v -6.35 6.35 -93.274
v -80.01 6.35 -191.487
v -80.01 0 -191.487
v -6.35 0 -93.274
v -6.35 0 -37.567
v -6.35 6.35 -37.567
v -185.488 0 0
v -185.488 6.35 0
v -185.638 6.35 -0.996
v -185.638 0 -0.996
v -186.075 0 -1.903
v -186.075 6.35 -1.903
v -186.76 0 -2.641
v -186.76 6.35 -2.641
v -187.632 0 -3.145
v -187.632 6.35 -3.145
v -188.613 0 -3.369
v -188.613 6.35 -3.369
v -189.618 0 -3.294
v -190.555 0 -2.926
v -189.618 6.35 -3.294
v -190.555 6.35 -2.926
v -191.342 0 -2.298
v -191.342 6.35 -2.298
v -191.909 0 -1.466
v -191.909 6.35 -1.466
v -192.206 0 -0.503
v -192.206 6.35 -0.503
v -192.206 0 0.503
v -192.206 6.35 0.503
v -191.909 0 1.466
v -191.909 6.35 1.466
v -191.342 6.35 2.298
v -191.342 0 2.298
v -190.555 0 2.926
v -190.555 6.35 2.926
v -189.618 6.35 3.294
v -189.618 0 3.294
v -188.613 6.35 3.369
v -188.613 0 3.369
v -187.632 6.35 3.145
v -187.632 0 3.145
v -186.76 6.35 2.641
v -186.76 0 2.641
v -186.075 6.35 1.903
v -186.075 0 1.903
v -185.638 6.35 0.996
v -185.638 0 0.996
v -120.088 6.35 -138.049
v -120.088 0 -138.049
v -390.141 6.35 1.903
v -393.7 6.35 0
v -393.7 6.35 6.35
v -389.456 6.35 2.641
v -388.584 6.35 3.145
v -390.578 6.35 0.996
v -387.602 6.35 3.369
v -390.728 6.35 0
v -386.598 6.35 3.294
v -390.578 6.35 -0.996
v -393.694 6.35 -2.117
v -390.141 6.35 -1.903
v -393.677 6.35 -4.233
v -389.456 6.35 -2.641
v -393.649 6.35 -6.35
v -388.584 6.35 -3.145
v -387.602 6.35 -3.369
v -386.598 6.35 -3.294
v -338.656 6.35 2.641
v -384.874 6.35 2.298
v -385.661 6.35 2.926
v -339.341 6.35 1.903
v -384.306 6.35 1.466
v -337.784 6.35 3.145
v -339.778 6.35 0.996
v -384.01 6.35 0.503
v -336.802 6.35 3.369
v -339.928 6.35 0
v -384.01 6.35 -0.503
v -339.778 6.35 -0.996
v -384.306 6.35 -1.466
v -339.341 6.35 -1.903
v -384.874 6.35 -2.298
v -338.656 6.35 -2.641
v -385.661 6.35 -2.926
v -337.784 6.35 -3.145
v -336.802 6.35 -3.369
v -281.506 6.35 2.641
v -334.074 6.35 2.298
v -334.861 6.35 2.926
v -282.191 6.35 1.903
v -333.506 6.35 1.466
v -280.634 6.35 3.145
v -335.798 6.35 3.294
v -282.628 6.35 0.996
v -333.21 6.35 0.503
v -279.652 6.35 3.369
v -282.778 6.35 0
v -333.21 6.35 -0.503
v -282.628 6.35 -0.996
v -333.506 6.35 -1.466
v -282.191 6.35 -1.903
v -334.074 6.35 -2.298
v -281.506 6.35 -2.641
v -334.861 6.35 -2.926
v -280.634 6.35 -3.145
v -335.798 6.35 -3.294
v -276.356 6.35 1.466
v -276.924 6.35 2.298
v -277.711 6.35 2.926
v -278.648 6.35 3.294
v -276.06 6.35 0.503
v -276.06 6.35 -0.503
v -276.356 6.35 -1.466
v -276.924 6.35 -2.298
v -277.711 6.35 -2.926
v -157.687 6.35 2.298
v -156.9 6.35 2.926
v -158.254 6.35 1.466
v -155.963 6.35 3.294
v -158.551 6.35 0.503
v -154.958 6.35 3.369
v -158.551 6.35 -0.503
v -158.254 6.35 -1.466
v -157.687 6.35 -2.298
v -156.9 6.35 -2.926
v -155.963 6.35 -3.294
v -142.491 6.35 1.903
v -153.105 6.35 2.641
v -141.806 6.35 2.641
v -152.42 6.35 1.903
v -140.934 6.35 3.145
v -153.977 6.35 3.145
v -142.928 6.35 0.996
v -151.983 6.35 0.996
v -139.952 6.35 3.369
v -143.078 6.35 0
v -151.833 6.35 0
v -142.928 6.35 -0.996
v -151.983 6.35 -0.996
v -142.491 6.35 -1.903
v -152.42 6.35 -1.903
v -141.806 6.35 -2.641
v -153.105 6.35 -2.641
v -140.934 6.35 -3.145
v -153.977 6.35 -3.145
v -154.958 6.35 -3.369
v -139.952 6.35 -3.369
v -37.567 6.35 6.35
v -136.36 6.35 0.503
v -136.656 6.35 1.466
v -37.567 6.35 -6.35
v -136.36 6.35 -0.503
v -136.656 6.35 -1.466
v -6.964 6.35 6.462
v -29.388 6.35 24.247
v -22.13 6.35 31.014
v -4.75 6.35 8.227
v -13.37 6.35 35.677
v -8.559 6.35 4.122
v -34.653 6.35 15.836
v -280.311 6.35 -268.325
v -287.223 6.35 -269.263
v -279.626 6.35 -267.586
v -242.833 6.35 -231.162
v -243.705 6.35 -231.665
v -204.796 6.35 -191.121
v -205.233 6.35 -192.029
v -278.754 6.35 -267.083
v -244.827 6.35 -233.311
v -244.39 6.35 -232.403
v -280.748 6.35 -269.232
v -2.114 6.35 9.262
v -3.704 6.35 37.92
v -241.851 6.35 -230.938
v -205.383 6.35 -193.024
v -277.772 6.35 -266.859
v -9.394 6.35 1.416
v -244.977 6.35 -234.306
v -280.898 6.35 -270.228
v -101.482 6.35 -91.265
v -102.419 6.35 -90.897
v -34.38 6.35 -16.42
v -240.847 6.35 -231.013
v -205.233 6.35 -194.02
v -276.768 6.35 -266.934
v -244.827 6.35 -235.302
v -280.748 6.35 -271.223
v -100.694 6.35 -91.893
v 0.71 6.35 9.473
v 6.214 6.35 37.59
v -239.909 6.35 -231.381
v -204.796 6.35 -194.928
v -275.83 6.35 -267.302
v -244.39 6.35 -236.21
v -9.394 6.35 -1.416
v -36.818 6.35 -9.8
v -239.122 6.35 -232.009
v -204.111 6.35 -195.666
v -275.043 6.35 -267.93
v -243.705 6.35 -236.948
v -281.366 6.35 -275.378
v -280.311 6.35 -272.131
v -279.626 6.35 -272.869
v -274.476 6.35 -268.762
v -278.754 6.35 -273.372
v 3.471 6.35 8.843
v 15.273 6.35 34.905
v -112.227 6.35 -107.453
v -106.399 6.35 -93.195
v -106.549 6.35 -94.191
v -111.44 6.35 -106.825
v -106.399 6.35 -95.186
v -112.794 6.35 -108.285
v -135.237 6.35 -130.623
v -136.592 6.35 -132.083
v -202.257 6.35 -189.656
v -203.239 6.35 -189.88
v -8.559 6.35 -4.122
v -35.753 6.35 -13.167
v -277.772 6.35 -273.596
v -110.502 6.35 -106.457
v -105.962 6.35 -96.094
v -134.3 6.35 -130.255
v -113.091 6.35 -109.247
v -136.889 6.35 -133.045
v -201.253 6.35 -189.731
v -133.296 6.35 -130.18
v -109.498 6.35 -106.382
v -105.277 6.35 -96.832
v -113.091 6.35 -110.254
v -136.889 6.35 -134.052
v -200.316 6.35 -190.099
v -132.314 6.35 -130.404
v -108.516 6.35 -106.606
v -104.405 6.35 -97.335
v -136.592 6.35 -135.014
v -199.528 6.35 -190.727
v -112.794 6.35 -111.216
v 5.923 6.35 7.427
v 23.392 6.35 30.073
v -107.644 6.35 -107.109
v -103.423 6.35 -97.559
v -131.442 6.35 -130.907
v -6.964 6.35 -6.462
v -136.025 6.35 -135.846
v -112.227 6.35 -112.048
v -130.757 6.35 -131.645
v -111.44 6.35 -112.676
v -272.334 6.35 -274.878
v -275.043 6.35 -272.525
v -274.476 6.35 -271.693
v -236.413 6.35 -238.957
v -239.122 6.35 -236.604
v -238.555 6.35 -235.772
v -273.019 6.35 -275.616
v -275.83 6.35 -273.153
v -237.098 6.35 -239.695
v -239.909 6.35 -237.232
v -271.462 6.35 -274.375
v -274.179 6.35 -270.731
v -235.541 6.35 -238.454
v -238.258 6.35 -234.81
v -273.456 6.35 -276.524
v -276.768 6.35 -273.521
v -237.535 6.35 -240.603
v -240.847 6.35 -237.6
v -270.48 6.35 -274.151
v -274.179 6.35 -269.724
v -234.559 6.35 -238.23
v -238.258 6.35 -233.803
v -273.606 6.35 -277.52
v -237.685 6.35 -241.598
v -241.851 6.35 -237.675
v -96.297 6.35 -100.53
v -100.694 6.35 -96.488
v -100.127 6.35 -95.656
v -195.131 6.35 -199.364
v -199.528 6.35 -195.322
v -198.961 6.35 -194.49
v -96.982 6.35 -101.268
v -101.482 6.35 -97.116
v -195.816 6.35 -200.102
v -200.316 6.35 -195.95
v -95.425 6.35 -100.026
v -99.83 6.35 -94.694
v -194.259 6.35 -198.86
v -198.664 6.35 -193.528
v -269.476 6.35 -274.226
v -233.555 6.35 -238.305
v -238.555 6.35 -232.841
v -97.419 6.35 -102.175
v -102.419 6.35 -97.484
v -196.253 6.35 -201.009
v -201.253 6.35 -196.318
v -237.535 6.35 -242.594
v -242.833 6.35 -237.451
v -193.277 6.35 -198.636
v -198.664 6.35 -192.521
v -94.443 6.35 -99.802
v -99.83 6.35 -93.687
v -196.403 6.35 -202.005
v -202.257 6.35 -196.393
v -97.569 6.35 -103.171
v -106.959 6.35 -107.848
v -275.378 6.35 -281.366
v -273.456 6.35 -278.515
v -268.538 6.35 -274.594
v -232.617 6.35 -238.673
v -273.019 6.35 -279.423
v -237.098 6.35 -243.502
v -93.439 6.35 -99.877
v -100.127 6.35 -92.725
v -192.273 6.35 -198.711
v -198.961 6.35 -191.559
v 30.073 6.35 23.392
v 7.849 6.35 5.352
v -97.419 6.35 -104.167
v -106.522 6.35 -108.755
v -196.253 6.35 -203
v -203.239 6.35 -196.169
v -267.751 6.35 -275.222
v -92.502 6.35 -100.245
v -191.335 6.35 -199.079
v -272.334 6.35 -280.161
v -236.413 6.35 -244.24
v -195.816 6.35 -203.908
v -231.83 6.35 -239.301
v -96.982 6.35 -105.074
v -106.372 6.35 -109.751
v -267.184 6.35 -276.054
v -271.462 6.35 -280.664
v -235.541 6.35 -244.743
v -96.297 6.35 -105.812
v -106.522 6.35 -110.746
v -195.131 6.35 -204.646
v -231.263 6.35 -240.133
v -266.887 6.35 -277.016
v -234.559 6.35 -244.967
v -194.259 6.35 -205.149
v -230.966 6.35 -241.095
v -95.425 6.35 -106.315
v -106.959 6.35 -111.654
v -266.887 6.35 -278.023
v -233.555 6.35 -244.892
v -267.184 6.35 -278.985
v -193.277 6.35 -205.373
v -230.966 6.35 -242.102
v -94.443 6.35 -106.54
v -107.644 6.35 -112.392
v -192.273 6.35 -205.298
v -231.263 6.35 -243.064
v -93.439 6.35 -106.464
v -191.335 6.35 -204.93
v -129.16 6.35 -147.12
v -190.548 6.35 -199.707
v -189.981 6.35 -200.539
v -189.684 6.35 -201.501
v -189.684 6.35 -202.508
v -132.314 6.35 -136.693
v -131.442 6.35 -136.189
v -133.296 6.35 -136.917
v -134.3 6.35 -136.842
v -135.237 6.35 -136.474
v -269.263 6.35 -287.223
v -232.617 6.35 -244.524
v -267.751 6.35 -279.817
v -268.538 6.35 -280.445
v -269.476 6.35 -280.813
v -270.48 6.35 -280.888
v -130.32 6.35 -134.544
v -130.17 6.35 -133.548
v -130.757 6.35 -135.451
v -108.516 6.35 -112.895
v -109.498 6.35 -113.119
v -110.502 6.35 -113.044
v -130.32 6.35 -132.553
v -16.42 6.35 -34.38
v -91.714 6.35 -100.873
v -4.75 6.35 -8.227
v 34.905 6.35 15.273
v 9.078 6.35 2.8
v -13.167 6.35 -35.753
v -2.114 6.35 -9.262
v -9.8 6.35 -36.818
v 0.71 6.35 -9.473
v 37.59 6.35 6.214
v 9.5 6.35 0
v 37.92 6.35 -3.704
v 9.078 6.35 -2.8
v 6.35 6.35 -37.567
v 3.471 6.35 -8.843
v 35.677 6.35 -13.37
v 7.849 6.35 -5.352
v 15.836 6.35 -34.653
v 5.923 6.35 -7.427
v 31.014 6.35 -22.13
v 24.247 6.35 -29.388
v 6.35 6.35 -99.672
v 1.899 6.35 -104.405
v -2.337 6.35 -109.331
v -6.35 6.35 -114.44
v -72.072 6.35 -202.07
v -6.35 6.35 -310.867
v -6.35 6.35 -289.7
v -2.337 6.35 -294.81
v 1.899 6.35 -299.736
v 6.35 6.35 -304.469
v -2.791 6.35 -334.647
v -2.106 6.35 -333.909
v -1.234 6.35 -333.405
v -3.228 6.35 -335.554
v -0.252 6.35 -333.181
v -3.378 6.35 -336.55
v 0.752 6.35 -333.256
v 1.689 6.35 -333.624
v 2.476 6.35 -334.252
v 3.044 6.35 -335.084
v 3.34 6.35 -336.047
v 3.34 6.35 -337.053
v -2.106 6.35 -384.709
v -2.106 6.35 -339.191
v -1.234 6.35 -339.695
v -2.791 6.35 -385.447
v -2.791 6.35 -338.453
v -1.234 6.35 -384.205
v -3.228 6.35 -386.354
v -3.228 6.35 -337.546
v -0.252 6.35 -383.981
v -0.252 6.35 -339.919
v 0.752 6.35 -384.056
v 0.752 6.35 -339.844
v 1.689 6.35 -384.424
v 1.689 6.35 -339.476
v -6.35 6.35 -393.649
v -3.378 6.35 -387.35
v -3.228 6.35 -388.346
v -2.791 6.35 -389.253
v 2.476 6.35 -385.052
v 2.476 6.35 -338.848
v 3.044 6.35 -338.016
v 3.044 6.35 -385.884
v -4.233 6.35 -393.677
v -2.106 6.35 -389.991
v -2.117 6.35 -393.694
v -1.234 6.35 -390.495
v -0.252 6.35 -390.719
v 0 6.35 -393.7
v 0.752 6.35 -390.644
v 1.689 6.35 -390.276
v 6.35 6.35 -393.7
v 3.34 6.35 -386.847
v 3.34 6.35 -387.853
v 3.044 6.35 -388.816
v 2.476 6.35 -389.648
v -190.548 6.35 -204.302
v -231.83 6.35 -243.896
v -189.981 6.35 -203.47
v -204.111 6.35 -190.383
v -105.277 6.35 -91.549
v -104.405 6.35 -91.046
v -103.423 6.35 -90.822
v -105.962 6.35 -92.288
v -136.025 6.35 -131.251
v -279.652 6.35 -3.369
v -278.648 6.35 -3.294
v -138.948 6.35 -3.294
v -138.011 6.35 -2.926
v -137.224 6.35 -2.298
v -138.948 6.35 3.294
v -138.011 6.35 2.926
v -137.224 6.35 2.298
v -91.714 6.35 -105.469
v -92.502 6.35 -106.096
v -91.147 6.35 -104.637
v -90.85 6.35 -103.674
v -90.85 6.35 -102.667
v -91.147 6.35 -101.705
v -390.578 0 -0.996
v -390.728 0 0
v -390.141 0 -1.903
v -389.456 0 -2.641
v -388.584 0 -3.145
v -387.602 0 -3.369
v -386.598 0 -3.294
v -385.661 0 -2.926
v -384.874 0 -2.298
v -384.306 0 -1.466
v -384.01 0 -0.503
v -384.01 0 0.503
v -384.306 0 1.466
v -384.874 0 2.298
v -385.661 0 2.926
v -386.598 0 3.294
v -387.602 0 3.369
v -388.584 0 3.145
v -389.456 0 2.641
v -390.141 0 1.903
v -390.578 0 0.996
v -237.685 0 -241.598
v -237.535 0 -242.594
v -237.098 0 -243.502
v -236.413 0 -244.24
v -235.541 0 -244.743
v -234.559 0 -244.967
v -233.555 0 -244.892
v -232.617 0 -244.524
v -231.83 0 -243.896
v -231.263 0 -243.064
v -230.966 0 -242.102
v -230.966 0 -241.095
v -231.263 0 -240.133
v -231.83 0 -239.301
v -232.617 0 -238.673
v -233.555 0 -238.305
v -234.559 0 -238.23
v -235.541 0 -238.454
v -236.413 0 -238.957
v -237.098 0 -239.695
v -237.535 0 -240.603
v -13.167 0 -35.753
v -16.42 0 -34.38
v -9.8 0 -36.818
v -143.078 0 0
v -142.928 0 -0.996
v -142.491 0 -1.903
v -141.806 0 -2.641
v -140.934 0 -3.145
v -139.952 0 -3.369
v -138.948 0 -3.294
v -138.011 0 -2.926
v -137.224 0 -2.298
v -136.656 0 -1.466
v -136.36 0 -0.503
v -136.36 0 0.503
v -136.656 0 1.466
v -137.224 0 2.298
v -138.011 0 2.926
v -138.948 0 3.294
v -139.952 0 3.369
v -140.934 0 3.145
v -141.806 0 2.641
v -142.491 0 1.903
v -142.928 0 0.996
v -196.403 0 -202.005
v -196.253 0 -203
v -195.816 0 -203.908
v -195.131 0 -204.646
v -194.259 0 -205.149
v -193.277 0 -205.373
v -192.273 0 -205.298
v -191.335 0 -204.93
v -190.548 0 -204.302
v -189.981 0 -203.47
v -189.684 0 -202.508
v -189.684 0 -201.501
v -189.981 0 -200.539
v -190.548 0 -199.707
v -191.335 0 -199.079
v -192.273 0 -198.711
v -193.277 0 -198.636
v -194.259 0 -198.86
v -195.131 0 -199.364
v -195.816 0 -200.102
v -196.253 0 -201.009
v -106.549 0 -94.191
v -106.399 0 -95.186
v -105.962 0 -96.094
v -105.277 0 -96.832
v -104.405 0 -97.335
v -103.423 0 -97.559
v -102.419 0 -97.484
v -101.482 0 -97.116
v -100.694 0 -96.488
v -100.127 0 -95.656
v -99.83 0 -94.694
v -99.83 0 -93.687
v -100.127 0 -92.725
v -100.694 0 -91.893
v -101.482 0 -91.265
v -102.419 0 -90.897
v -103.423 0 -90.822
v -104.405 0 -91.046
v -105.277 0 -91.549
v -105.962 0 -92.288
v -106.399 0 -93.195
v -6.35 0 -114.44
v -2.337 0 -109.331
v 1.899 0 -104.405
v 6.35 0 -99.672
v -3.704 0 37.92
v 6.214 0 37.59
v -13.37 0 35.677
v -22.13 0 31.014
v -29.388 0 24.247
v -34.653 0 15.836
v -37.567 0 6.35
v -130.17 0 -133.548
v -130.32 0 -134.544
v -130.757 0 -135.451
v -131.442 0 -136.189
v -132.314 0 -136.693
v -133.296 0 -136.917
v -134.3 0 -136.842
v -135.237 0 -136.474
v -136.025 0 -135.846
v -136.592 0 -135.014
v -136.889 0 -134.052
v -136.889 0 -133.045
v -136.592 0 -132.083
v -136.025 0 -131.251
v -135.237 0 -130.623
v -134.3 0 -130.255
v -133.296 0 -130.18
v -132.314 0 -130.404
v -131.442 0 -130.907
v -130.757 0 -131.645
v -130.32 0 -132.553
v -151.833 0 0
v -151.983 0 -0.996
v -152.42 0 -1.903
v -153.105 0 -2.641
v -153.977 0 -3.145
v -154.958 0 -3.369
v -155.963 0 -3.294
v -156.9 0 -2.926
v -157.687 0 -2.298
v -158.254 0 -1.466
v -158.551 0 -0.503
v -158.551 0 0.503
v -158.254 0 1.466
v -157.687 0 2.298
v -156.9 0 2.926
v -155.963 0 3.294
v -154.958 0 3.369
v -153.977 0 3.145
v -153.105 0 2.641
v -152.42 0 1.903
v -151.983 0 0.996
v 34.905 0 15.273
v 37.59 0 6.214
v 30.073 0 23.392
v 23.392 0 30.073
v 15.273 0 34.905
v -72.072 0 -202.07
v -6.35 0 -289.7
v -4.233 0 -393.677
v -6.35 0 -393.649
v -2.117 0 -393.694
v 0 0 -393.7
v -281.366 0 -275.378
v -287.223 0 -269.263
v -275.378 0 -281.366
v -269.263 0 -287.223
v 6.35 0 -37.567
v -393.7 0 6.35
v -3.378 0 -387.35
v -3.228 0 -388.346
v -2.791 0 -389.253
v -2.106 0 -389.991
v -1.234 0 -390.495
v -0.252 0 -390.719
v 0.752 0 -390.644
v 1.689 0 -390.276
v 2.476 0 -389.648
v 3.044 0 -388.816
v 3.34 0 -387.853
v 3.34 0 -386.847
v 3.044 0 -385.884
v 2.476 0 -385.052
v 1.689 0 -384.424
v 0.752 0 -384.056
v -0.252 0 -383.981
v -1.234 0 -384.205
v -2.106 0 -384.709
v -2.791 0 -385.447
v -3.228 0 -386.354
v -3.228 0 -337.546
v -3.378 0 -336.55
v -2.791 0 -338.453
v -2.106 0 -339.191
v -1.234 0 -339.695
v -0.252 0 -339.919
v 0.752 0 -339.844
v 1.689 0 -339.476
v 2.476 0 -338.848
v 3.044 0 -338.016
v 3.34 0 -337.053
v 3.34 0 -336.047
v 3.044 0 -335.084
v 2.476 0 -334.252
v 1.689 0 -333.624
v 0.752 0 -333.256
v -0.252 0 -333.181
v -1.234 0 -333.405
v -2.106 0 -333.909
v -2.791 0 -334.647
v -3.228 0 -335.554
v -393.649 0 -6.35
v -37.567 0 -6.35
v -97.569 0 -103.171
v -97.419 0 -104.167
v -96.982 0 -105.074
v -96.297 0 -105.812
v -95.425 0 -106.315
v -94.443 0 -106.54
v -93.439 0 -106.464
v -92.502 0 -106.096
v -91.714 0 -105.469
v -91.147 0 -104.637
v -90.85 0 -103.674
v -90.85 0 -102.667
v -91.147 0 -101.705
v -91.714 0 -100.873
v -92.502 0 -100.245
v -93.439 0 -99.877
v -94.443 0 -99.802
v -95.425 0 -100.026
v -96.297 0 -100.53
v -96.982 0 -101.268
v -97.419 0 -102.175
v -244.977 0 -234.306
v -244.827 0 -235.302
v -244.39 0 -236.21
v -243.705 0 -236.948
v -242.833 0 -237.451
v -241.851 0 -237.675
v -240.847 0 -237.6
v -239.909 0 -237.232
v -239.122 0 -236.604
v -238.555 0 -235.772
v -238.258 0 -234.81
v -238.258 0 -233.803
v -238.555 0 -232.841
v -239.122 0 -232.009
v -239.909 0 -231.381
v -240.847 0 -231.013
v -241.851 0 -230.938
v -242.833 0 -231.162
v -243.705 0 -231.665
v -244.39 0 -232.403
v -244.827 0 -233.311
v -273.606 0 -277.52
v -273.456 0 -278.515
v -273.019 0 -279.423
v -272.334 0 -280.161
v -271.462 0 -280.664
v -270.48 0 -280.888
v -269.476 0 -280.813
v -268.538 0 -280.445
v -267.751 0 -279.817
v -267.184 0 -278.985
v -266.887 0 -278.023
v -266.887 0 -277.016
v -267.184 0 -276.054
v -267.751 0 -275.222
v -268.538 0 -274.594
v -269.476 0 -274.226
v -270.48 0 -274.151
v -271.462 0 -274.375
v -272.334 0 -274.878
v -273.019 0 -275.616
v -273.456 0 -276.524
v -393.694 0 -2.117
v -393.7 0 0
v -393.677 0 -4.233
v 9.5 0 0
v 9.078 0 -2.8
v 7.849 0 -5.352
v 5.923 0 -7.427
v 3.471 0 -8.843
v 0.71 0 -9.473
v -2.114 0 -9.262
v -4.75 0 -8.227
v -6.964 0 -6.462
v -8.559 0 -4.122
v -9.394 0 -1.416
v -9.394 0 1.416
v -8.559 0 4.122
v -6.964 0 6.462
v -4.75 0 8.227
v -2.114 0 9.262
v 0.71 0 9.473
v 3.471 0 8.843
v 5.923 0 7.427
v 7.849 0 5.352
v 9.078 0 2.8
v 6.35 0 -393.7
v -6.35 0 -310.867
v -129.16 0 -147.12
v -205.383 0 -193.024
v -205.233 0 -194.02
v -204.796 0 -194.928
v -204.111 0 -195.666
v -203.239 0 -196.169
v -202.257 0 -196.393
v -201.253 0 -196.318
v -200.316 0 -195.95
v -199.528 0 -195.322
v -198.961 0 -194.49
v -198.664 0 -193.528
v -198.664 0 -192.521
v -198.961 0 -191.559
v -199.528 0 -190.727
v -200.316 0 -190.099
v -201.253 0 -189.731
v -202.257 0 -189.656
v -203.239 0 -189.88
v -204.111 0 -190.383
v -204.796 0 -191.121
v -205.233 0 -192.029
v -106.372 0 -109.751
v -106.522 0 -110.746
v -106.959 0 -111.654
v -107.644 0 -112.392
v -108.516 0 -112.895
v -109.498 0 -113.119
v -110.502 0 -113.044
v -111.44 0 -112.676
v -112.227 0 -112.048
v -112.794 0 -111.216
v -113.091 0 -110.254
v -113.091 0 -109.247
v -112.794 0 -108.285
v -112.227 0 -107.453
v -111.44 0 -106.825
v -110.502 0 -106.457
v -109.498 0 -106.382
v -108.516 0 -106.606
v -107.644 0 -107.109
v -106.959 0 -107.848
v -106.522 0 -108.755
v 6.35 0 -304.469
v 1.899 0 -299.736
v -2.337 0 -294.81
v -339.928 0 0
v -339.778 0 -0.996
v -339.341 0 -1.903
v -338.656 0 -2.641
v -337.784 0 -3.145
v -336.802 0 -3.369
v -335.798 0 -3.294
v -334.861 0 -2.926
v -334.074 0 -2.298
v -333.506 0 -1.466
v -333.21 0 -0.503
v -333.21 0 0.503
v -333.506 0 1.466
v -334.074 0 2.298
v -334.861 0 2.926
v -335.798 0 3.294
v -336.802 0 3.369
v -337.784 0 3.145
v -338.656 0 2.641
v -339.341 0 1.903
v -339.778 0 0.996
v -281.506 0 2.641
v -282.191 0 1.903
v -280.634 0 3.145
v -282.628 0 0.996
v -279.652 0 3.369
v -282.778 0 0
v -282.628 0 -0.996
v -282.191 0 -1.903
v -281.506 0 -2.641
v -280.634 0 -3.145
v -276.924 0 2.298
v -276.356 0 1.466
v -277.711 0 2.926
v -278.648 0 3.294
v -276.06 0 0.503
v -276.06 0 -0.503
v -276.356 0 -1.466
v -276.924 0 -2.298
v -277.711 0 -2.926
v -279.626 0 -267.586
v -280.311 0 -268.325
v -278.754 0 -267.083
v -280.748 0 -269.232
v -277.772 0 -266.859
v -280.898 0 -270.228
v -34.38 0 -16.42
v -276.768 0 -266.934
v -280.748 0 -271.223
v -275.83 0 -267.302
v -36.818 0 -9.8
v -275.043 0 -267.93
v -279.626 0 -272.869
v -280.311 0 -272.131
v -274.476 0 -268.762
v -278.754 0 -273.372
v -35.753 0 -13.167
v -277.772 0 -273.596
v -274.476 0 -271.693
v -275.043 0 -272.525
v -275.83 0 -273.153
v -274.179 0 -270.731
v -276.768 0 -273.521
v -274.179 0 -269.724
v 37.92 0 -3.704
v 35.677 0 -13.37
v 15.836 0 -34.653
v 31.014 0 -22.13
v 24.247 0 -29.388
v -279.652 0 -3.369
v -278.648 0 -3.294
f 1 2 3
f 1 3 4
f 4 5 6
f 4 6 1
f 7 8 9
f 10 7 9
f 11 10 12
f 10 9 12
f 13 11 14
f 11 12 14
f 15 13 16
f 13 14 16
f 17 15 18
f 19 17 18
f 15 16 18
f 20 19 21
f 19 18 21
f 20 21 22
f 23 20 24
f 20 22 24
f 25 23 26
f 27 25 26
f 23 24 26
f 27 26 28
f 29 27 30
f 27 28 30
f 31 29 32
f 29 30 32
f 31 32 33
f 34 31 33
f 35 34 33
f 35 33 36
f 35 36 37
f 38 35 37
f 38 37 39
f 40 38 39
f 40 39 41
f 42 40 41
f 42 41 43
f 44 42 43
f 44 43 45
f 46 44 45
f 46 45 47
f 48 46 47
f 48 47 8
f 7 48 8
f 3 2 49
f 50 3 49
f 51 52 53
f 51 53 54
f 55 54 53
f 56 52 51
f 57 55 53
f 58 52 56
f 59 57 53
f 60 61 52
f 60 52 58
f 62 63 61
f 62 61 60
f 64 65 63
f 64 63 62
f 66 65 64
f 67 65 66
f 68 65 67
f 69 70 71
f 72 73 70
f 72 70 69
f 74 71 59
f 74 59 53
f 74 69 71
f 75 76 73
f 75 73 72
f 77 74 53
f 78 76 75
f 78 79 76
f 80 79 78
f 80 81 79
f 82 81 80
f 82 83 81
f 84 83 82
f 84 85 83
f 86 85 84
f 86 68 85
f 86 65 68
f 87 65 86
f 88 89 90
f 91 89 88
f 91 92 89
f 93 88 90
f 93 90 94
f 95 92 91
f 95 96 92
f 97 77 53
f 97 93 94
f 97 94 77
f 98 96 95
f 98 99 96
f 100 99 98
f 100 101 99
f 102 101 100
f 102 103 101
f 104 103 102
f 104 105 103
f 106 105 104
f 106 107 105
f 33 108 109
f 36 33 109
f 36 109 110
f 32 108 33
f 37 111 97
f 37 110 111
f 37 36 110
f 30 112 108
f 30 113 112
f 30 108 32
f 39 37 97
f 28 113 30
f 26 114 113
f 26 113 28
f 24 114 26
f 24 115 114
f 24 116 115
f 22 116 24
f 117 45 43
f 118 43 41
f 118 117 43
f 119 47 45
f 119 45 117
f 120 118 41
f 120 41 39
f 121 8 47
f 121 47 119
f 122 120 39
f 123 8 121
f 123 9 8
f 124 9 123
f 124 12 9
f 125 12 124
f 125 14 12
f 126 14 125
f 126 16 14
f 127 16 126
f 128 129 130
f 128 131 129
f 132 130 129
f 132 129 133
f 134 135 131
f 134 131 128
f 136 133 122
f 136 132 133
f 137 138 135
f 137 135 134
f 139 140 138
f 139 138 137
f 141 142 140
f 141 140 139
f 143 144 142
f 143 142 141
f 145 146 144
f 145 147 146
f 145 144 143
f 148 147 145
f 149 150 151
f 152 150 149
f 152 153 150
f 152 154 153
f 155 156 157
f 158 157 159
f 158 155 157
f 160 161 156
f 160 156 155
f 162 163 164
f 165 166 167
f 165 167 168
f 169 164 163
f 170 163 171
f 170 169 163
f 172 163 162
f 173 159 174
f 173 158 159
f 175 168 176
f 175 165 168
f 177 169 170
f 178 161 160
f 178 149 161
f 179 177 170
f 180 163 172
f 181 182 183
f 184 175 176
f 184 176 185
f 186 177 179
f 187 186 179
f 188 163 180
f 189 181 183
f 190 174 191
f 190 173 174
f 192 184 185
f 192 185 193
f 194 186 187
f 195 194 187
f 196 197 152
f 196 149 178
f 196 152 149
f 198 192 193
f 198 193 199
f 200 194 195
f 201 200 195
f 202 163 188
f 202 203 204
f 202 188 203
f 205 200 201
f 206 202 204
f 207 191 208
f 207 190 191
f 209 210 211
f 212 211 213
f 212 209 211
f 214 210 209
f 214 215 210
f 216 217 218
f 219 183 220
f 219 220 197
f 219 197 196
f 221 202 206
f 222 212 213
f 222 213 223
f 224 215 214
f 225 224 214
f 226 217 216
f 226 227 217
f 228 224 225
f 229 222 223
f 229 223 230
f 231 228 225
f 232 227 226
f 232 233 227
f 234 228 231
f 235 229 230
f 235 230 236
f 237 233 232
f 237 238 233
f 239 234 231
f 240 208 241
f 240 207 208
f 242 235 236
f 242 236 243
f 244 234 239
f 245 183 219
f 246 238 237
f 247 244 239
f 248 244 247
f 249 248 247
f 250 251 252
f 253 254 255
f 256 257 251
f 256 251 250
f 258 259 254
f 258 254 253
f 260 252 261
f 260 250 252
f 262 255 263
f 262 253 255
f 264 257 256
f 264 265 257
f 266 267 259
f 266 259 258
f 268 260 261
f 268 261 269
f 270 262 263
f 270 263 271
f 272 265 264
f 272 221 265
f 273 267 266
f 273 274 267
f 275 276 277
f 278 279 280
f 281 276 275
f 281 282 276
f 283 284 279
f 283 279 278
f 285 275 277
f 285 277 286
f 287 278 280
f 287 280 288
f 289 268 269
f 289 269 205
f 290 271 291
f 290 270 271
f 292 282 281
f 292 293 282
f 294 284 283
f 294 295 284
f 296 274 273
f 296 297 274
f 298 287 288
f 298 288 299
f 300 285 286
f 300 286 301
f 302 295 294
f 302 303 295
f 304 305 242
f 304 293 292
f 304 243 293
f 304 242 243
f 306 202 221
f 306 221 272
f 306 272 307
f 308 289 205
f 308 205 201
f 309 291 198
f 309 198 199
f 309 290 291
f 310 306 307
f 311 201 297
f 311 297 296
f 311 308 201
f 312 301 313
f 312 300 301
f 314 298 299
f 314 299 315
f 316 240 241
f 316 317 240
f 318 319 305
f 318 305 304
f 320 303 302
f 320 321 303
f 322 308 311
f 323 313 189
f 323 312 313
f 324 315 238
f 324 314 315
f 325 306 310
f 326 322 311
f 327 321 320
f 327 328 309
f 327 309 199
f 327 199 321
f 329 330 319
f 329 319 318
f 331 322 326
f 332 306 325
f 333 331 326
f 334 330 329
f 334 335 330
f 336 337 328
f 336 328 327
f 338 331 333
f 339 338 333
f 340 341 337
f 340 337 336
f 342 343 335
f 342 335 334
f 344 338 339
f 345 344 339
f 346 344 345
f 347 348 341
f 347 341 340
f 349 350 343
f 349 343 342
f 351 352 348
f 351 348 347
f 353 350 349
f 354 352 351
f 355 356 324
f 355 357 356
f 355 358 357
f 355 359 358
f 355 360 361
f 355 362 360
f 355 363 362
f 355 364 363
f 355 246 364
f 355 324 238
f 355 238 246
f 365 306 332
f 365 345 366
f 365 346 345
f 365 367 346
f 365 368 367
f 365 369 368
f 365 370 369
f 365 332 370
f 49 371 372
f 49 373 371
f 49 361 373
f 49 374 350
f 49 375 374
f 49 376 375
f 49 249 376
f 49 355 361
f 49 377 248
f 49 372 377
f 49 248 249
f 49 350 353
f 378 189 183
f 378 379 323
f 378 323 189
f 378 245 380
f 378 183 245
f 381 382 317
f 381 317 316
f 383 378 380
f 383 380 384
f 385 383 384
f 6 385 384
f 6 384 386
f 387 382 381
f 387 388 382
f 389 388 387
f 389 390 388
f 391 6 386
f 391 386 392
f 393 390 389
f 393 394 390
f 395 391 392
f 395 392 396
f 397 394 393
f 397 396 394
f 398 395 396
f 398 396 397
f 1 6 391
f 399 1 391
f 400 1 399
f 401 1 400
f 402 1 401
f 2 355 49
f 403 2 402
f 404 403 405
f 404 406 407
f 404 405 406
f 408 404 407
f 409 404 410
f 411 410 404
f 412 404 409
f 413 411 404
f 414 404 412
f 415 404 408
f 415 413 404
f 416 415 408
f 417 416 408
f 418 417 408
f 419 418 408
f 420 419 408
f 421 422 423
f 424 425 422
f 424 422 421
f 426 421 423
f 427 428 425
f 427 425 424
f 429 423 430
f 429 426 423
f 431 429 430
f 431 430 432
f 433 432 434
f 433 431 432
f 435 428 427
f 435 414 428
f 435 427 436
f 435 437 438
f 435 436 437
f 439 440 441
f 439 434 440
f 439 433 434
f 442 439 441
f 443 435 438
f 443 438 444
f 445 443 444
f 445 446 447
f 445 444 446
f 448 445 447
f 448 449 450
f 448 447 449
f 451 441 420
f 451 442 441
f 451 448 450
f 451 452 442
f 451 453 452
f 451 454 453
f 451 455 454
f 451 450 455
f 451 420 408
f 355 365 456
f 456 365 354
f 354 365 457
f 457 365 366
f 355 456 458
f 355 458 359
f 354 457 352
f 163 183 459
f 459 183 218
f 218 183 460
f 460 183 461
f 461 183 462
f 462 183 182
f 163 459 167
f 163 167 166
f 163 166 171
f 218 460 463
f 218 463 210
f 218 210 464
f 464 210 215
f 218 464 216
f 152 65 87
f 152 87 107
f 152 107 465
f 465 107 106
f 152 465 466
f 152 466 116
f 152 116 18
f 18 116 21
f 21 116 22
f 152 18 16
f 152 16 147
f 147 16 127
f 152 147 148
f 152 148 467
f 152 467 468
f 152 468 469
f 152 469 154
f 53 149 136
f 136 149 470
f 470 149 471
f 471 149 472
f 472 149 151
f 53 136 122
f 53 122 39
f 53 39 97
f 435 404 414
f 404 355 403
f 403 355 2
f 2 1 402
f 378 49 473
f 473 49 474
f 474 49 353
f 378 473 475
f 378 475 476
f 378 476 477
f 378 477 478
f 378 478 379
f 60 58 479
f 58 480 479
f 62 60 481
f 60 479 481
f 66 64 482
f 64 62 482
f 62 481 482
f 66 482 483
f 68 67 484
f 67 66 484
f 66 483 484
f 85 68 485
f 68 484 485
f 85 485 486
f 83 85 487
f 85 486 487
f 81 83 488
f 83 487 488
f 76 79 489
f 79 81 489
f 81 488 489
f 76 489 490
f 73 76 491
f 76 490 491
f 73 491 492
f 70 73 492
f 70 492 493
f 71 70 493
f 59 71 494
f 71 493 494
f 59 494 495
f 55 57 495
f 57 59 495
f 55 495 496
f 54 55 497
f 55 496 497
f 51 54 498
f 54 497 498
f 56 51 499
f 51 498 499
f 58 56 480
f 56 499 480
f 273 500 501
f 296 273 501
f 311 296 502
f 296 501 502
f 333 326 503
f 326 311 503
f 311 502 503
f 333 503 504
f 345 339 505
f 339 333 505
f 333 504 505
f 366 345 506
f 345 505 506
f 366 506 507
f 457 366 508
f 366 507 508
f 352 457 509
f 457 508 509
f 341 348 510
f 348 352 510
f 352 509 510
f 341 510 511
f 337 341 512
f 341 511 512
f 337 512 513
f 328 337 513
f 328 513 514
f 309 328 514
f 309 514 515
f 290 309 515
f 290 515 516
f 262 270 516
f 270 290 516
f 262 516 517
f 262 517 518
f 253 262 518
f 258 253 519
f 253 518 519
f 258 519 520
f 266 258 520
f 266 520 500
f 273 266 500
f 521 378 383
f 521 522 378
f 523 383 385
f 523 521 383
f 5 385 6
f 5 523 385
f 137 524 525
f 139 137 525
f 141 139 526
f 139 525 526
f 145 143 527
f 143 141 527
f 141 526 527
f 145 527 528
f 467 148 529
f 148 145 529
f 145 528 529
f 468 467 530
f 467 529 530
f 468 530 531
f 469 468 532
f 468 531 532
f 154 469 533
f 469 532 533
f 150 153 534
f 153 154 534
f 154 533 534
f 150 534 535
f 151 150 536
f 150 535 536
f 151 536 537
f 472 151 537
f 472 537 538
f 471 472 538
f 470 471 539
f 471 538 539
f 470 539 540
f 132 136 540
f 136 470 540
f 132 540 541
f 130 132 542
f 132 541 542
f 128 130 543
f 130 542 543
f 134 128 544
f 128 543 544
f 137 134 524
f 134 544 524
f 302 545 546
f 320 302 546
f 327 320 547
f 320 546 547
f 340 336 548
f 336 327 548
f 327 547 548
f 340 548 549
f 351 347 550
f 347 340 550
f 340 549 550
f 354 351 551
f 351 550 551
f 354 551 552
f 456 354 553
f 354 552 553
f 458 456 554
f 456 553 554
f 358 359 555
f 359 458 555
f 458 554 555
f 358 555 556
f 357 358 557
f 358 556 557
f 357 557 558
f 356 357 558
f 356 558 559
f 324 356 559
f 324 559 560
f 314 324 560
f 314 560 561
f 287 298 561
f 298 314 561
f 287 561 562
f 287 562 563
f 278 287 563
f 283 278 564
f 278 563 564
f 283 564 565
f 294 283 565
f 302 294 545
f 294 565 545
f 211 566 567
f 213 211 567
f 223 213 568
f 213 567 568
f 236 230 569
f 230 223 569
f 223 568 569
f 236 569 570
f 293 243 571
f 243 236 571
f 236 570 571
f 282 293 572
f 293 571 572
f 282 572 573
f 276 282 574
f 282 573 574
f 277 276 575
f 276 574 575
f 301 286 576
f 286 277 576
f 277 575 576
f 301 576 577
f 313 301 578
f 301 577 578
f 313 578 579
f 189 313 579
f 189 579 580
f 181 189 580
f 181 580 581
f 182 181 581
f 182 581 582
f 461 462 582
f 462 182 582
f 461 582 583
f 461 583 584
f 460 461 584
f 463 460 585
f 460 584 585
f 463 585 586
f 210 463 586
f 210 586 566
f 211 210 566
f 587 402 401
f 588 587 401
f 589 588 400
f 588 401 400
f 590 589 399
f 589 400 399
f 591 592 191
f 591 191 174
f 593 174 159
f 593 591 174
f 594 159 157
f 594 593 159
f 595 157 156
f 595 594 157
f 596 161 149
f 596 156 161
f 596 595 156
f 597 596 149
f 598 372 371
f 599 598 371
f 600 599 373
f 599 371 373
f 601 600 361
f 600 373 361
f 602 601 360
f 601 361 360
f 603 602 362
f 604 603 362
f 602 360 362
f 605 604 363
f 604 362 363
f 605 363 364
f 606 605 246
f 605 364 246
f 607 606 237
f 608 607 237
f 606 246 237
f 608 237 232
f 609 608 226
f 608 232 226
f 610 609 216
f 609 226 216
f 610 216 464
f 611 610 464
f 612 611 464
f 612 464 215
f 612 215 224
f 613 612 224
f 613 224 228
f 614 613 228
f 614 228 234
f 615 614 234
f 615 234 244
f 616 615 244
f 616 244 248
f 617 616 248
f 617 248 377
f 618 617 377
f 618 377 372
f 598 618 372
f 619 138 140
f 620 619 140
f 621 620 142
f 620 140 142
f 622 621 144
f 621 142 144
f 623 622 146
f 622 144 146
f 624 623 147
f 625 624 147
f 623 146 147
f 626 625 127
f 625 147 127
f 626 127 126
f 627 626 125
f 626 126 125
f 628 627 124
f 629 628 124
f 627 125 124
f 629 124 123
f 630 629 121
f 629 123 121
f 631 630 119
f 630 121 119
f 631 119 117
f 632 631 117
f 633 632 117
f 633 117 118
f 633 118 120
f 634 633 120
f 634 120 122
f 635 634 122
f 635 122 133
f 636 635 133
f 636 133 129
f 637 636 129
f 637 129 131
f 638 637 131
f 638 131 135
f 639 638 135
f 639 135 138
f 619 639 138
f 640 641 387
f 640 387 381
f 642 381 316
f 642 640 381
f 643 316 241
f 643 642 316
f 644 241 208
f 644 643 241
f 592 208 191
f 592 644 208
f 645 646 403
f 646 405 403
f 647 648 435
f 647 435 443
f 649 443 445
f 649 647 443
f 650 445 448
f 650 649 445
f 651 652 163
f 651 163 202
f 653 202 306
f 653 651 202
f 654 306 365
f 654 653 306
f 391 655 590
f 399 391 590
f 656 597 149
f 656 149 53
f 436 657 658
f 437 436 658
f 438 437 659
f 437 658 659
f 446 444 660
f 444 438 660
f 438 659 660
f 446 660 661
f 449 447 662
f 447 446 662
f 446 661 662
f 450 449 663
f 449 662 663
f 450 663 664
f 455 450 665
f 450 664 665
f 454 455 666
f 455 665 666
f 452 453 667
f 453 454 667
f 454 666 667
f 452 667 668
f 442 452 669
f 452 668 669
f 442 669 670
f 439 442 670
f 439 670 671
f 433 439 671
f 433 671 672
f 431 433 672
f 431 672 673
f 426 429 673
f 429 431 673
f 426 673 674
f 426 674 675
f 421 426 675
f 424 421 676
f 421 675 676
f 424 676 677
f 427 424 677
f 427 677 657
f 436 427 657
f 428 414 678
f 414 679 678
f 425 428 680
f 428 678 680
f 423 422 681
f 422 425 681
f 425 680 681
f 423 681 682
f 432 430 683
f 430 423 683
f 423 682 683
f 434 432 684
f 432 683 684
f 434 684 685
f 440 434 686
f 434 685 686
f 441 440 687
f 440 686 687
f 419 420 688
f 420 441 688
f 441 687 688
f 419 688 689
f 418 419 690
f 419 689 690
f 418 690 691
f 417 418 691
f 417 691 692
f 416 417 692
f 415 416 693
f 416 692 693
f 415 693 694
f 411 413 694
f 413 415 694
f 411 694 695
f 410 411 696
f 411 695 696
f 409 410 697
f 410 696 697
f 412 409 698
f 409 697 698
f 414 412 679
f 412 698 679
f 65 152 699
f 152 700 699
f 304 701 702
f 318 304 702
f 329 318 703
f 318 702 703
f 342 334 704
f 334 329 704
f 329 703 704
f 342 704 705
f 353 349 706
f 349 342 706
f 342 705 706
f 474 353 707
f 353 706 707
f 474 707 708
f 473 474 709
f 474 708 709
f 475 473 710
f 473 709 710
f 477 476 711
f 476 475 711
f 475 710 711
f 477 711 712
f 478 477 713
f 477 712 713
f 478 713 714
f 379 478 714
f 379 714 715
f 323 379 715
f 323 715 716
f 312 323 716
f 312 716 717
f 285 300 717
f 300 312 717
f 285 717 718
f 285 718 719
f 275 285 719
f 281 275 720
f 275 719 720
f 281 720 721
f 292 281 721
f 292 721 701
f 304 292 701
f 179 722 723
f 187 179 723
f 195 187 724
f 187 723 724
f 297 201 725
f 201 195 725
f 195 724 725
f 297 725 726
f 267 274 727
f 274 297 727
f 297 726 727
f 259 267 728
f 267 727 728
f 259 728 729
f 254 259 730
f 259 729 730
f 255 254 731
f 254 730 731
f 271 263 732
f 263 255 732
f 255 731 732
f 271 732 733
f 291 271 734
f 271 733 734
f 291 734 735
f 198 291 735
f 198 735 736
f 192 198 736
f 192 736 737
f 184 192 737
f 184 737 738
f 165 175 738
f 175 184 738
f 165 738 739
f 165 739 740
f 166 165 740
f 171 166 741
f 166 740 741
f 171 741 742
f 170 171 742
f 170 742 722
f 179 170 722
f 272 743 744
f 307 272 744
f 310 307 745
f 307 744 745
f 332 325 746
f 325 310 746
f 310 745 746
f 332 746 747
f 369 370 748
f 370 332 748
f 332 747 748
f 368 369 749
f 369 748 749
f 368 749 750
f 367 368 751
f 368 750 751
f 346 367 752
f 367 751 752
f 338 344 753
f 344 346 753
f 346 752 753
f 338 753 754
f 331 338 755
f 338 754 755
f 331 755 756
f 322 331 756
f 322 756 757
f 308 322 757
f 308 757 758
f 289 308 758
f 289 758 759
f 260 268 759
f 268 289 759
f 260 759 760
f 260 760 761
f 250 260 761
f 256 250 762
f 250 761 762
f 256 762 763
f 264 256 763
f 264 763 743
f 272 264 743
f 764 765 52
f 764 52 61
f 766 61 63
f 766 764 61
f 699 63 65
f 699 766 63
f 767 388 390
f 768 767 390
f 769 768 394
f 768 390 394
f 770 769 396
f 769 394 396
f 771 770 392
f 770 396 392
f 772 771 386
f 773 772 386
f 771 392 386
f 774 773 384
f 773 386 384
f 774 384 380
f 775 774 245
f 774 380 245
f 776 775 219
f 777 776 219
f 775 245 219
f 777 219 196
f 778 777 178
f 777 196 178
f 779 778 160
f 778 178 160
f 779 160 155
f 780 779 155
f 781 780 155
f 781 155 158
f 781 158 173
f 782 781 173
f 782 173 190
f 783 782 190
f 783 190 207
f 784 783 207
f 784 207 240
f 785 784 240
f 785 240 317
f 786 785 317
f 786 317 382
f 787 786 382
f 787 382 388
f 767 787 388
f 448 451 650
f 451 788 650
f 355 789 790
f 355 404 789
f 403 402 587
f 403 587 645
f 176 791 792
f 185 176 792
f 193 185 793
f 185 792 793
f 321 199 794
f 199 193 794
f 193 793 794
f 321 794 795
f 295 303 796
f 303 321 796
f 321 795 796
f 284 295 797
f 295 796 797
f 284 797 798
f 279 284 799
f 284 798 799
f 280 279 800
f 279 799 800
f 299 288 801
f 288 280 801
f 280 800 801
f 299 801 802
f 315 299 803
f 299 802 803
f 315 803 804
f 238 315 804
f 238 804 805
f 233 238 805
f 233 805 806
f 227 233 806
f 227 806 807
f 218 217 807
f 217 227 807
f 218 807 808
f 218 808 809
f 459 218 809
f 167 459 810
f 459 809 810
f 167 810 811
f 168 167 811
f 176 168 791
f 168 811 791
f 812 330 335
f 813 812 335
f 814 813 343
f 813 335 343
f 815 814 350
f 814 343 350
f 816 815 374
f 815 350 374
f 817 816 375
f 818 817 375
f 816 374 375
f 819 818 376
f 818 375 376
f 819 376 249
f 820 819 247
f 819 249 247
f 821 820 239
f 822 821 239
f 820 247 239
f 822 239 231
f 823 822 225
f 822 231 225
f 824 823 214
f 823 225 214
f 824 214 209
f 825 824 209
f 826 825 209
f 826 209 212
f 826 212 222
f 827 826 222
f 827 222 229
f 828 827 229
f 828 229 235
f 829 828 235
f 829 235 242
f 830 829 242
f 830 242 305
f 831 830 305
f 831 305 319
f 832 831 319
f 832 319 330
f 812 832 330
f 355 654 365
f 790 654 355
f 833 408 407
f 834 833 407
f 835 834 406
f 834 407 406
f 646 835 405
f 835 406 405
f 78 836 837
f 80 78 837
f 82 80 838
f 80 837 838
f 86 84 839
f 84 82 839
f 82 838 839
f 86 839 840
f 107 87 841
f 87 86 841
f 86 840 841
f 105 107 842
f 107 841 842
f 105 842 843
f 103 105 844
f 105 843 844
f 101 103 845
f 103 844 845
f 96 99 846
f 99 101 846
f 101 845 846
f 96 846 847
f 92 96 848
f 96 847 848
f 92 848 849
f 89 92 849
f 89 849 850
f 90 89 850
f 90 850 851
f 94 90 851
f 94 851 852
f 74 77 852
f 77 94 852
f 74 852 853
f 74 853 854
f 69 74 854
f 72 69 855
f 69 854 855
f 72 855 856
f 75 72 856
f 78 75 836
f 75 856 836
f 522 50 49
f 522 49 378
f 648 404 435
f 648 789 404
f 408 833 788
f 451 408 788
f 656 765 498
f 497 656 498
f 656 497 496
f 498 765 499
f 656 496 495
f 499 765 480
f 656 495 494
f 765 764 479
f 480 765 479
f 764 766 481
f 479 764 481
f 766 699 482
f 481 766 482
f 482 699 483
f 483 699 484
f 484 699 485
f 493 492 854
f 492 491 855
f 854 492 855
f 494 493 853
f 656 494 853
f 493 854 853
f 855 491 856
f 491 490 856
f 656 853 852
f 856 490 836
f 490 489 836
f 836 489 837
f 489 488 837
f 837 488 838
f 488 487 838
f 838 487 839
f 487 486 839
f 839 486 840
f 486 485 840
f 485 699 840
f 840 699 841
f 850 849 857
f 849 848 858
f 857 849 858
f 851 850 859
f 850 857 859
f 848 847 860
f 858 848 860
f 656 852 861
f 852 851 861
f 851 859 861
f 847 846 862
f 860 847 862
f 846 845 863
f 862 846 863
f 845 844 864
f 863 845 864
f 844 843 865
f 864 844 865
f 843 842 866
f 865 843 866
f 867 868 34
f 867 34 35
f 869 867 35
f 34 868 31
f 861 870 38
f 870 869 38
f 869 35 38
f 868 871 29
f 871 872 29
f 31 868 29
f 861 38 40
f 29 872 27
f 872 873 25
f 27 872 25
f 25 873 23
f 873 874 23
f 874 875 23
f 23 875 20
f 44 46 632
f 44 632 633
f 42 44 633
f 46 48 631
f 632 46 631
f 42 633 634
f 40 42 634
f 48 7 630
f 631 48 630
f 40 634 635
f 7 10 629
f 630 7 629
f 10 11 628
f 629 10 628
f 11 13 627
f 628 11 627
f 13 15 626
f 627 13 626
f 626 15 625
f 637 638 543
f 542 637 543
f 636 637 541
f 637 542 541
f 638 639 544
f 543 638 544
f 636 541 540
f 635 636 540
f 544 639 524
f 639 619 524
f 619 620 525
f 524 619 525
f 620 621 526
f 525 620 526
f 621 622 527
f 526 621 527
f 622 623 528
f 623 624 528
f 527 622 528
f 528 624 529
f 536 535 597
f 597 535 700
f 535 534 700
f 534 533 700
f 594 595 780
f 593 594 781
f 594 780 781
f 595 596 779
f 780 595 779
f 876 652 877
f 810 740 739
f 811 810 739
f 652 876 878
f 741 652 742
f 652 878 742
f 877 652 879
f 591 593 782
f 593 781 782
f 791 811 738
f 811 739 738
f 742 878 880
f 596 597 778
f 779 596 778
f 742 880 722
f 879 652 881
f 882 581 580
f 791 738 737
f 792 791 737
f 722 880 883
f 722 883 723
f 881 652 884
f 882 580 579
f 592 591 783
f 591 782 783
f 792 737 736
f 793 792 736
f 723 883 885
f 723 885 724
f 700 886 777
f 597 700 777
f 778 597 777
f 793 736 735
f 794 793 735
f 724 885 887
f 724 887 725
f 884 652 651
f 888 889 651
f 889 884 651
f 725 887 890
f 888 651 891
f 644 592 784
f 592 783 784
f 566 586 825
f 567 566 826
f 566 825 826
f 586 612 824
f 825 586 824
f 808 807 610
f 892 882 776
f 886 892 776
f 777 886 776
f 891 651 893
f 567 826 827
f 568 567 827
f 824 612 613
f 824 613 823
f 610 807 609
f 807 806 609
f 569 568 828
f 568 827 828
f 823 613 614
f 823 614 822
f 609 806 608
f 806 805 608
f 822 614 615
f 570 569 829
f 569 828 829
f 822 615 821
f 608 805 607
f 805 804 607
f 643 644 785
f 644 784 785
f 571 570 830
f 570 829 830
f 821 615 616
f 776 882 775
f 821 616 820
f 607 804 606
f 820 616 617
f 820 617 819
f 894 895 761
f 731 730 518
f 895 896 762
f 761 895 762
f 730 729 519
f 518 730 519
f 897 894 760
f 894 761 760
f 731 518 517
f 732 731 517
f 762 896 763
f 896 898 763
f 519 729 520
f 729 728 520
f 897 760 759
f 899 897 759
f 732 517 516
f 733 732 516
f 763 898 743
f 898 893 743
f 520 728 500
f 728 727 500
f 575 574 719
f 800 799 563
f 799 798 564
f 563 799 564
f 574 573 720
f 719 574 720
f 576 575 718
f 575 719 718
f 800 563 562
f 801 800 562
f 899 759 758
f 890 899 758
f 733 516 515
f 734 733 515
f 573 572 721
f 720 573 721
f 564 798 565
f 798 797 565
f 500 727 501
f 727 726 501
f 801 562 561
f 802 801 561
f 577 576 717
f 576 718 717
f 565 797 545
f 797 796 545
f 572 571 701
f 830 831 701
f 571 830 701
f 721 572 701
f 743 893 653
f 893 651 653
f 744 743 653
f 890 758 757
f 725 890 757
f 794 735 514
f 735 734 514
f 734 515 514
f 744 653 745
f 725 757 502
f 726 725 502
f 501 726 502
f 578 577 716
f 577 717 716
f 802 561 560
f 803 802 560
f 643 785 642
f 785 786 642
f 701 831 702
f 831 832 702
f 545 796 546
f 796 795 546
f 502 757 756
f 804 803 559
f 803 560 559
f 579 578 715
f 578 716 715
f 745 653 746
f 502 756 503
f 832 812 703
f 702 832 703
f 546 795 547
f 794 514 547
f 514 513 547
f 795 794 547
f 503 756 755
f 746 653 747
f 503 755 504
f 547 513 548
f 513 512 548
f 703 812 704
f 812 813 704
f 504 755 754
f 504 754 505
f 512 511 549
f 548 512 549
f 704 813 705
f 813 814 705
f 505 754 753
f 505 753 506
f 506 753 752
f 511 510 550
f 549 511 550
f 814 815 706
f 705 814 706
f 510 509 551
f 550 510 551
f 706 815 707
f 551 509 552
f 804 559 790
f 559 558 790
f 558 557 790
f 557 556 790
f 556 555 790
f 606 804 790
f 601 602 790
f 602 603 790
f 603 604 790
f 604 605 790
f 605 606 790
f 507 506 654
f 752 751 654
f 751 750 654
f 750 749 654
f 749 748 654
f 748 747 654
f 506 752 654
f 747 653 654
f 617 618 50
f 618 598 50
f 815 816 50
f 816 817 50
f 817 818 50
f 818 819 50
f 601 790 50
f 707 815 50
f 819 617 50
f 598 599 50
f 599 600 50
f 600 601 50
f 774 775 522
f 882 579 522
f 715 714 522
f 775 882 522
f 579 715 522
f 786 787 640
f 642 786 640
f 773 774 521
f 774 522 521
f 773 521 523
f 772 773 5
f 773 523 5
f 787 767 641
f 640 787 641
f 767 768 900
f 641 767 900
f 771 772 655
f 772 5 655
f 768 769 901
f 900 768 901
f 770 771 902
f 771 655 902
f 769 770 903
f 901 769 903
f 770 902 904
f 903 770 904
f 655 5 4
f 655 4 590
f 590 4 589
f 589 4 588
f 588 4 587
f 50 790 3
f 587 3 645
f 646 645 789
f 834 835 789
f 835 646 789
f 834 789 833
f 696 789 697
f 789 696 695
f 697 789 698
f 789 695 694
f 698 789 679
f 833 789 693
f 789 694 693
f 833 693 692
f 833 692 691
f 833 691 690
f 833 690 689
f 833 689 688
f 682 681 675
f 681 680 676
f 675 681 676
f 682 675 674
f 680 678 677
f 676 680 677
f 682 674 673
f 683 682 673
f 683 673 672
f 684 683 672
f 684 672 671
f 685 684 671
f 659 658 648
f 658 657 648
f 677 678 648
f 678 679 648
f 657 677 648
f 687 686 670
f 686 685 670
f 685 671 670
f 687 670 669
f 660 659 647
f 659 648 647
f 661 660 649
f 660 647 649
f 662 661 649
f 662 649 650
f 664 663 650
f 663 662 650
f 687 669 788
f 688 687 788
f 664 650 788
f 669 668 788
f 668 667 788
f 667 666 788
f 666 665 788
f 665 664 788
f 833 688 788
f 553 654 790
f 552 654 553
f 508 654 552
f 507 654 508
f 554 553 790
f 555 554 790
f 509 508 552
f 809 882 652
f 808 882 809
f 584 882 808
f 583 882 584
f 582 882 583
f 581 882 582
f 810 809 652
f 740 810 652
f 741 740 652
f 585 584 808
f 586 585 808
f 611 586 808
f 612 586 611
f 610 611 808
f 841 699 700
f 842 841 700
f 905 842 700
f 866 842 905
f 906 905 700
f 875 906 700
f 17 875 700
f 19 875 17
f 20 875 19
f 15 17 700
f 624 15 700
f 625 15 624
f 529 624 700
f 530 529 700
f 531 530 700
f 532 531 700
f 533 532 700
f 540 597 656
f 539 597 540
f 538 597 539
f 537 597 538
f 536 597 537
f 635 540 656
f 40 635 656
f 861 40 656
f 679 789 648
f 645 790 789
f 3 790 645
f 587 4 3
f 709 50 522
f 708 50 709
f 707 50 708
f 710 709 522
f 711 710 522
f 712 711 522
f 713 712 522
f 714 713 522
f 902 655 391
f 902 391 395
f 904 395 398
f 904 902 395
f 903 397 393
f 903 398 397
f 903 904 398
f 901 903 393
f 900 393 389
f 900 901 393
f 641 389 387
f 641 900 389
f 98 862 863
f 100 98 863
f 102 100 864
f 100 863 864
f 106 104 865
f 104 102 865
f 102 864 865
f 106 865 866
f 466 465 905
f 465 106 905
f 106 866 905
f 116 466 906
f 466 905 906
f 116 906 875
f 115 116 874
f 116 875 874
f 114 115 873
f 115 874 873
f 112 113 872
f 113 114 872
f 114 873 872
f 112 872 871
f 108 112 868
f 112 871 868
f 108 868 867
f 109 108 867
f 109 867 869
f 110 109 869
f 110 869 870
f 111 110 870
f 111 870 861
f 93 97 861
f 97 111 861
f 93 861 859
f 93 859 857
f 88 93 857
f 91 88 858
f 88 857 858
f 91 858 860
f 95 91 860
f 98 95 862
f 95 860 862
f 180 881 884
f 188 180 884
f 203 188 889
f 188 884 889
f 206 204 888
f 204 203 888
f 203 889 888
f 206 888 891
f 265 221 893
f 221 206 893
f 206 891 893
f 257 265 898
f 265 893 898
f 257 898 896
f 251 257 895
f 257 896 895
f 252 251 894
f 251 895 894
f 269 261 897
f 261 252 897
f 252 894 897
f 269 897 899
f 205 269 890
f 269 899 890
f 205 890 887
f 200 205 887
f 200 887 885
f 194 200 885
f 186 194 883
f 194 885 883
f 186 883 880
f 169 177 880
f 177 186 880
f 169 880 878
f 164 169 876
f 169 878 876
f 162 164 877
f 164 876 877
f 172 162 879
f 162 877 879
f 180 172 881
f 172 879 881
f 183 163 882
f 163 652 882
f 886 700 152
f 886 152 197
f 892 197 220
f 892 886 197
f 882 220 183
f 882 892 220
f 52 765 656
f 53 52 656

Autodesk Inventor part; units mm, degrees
ref_plane "YZ Plane" through (0, 0, 0) normal (1, 0, 0) x (0, 1, 0)
ref_plane "XZ Plane" through (0, 0, 0) normal (0, 1, 0) x (-1, 0, 0)
ref_plane "XY Plane" through (0, 0, 0) normal (0, 0, 1) x (1, 0, 0)
sketch "Sketch1" plane through (0, 0, 0) normal (0, 1, 0) x (-1, 0, 0)
  circle A0 centre (0, -139.7) radius 3.3782
  line L0 (6.35, -37.5671) -> (6.35, -393.6488)
  line L1 (-6.35, -37.5671) -> (-6.35, -393.7)
  circle A1 centre (193.0245, -202.0047) radius 3.3782
  circle A2 centre (202.0047, -193.0245) radius 3.3782
  line L2 (269.2628, -287.2233) -> (16.4197, -34.3803)
  line L3 (287.2233, -269.2628) -> (34.3803, -16.4197)
  circle A3 centre (94.1906, -103.1708) radius 3.3782
  circle A4 centre (103.1708, -94.1906) radius 3.3782
  circle A5 centre (139.7, 0) radius 3.3782
  line L4 (133.35, 0) -> (133.35, 6.35)
  line L5 (273.05, 6.35) -> (273.05, 0)
  line L6 (37.5671, -6.35) -> (393.6488, -6.35)
  line L7 (37.5671, 6.35) -> (393.7, 6.35)
  line L8 (146.05, 0) -> (146.05, 6.35)
  circle A6 centre (277.5195, -270.2276) radius 3.3782
  circle A7 centre (270.2276, -277.5195) radius 3.3782
  arc A8 (269.2628, -287.2233) -> (287.2233, -269.2628) centre (0, 0) ccw
  circle A9 centre (0, -387.35) radius 3.3782
  arc A10 (0, -393.7) -> (6.35, -393.6488) centre (0, 0) ccw
  line L9 (-6.35, -393.7) -> (0, -393.7)
  circle A11 centre (0, -279.4) radius 3.3782
  arc A12 (6.35, -37.5671) -> (16.4197, -34.3803) centre (0, 0) ccw
  arc A13 (34.3803, -16.4197) -> (37.5671, -6.35) centre (0, 0) ccw
  circle A14 centre (0, 0) radius 14.2875
  line L10 (38.1, 0) -> (38.1, 12.8556) construction
  arc A15 (-6.214, 37.5898) -> (-37.5898, 6.214) centre (0, 0) ccw
  arc A16 (37.5671, 6.35) -> (-6.35, -37.5671) centre (0, 0) ccw
  circle A17 centre (387.35, 0) radius 3.3782
  line L11 (393.7, 0) -> (393.7, 6.35)
  circle A18 centre (279.4, 0) radius 3.3782
  line L12 (285.75, 6.35) -> (285.75, 0)
  arc A19 (393.6488, -6.35) -> (393.7, 0) centre (0, 0) ccw
  line L13 (0, -285.75) -> (-6.35, -285.75)
  line L14 (-6.35, -273.05) -> (0, -273.05)
  circle A20 centre (0, -336.55) radius 3.3782
  circle A21 centre (241.5985, -234.3065) radius 3.3782
  circle A22 centre (234.3065, -241.5985) radius 3.3782
  circle A23 centre (336.55, 0) radius 3.3782
  dimension "d2" = 12.7
  dimension "d3" = 12.7
  dimension "d4" = 38.1
  dimension "d6" = 38.1
  dimension "d7" = 6.35
  dimension "d8" = 6.35
  dimension "d9" = 6.35
  dimension "d10" = 12.7
  dimension "d11" = 12.7
  dimension "d12" = 95.25
  dimension "d13" = 6.7564
  dimension "d14" = 6.7564
  dimension "d15" = 6.7564
  dimension "d16" = 6.35
  dimension "d17" = 6.7564
  dimension "d18" = 6.35
  dimension "d19" = 6.35
  dimension "d20" = 6.7564
  dimension "d21" = 6.7564
  dimension "d22" = 6.7564
  dimension "d23" = 6.35
  dimension "d24" = 6.7564
  dimension "d25" = 28.575
  dimension "d28" = 38.1
  dimension "d30" = 6.35
  dimension "d31" = 139.7
  dimension "d34" = 6.35
  dimension "d37" = 277.5195
  dimension "d38" = 270.2276
  dimension "d39" = 7.2919
  dimension "d40" = 7.2919
  dimension "d41" = 393.7
  dimension "d42" = 393.7
  dimension "d43" = 6.35
  dimension "d44" = 12.7
  dimension "d45" = 6.7564
  dimension "d46" = 6.35
  dimension "d47" = 6.7564
  dimension "d48" = 6.7564
  dimension "d49" = 393.7
  dimension "d50" = 6.35
  dimension "d51" = 6.7564
  dimension "d52" = 6.35
  dimension "d54" = 6.7564
  dimension "d55" = 6.7564
  dimension "d56" = 6.7564
  dimension "d57" = 50.8
  dimension "d58" = 50.8
  dimension "d59" = 50.8
  dimension "d60" = 7.5438
  dimension "d61" = 7.5438
  dimension "d62" = 7.5438
  dimension "d63" = 7.5438
  dimension "d64" = 50.8
extrude "Extrusion1" add sketch "Sketch1" along normal blind 6.35
sketch "Sketch7" plane through (0, 6.35, 0) normal (0, 1, 0) x (1, 0, 0)
  circle A0 centre (0, 0) radius 14.2875 projected
  circle A1 centre (0, 0) radius 9.5
  dimension "d99" = 19
extrude "Extrusion6" add sketch "Sketch7" against normal blind 6.35
sketch "Sketch9" plane through (0, 6.35, 0) normal (0, 1, 0) x (1, 0, 0)
  circle A0 centre (0, 139.7) radius 3.3782 projected
  circle A1 centre (0, 279.4) radius 3.3782 projected
  arc A2 (104.14, 347.9822) -> (104.1415, 56.1583) centre (110.49, 202.0703) ccw projected
  circle A3 centre (110.49, 202.0703) radius 146.05
  dimension "d102" = 0
  dimension "d103" = 0
  dimension "d104" = 0
extrude "Extrusion7" cut sketch "Sketch9" against normal blind 25.4
sketch "Sketch10" plane through (0, 6.35, 0) normal (0, 1, 0) x (1, 0, 0)
  arc A0 (6.35, 304.4688) -> (-6.35, 289.7003) centre (110.49, 202.0703) ccw projected
  line L0 (-6.35, 393.6488) -> (-6.35, 289.7003) projected
  arc A1 (-6.35, 114.4403) -> (6.35, 99.6717) centre (110.49, 202.0703) ccw projected
  line L1 (-6.35, 114.4403) -> (-6.35, 37.5671) projected
  arc A2 (-6.35, 37.5671) -> (-16.4197, 34.3803) centre (0, 0) ccw projected
  line L2 (-16.4197, 34.3803) -> (-269.2628, 287.2233) projected
  arc A3 (-269.2628, 287.2233) -> (-287.2233, 269.2628) centre (0, 0) ccw projected
  line L3 (-287.2233, 269.2628) -> (-34.3803, 16.4197) projected
  arc A4 (-34.3803, 16.4197) -> (-37.5671, 6.35) centre (0, 0) ccw projected
  line L4 (-37.5671, 6.35) -> (-393.6488, 6.35) projected
  arc A5 (-393.6488, 6.35) -> (-393.7, 0) centre (0, 0) ccw projected
  line L5 (-393.7, 0) -> (-393.7, -6.35) projected
  line L6 (-393.7, -6.35) -> (-37.5671, -6.35) projected
  arc A6 (-37.5671, -6.35) -> (6.35, 37.5671) centre (0, 0) ccw projected
  line L7 (6.35, 37.5671) -> (6.35, 99.6717) projected
  circle A7 centre (0, 0) radius 9.5 projected
  circle A8 centre (-270.2276, 277.5195) radius 3.3782 projected
  circle A9 centre (-277.5195, 270.2276) radius 3.3782 projected
  circle A10 centre (-234.3065, 241.5985) radius 3.3782 projected
  circle A11 centre (-241.5985, 234.3065) radius 3.3782 projected
  circle A12 centre (-387.35, 0) radius 3.3782 projected
  circle A13 centre (-336.55, 0) radius 3.3782 projected
  circle A14 centre (-139.7, 0) radius 3.3782 projected
  circle A15 centre (-279.4, 0) radius 3.3782 projected
  circle A16 centre (-94.1906, 103.1708) radius 3.3782 projected
  circle A17 centre (-103.1708, 94.1906) radius 3.3782 projected
  circle A18 centre (-193.0245, 202.0047) radius 3.3782 projected
  circle A19 centre (-202.0047, 193.0245) radius 3.3782 projected
  line L8 (-6.35, 114.4403) -> (-72.0725, 202.0703)
  line L9 (-6.35, 310.8669) -> (-129.1599, 147.1204)
  line L10 (-80.01, 191.4869) -> (-6.35, 93.2736)
  line L11 (-6.35, 289.7003) -> (-72.0725, 202.0703)
  line L12 (-80.01, 191.4869) -> (-120.0885, 138.049)
extrude "Extrusion8" add sketch "Sketch10" against normal blind 6.35 contours L0 L11 L8 L1 L10 L12 L2 L9
sketch "Sketch11" plane through (0, 6.35, 0) normal (0, 1, 0) x (1, 0, 0)
  circle A0 centre (-109.7506, 109.7506) radius 3.3782 projected
  circle A1 centre (-133.5483, 133.5483) radius 3.3782 projected
  circle A2 centre (-188.8658, 0) radius 3.3782 projected
  circle A3 centre (-155.2108, 0) radius 3.3782 projected
extrude "Extrusion9" cut sketch "Sketch11" against normal blind 25.4
equation "\"d60\" = d63"
equation "\"d61\" = d62"
properties part number "Bearing Mount Top" material "Aluminum 6061"
